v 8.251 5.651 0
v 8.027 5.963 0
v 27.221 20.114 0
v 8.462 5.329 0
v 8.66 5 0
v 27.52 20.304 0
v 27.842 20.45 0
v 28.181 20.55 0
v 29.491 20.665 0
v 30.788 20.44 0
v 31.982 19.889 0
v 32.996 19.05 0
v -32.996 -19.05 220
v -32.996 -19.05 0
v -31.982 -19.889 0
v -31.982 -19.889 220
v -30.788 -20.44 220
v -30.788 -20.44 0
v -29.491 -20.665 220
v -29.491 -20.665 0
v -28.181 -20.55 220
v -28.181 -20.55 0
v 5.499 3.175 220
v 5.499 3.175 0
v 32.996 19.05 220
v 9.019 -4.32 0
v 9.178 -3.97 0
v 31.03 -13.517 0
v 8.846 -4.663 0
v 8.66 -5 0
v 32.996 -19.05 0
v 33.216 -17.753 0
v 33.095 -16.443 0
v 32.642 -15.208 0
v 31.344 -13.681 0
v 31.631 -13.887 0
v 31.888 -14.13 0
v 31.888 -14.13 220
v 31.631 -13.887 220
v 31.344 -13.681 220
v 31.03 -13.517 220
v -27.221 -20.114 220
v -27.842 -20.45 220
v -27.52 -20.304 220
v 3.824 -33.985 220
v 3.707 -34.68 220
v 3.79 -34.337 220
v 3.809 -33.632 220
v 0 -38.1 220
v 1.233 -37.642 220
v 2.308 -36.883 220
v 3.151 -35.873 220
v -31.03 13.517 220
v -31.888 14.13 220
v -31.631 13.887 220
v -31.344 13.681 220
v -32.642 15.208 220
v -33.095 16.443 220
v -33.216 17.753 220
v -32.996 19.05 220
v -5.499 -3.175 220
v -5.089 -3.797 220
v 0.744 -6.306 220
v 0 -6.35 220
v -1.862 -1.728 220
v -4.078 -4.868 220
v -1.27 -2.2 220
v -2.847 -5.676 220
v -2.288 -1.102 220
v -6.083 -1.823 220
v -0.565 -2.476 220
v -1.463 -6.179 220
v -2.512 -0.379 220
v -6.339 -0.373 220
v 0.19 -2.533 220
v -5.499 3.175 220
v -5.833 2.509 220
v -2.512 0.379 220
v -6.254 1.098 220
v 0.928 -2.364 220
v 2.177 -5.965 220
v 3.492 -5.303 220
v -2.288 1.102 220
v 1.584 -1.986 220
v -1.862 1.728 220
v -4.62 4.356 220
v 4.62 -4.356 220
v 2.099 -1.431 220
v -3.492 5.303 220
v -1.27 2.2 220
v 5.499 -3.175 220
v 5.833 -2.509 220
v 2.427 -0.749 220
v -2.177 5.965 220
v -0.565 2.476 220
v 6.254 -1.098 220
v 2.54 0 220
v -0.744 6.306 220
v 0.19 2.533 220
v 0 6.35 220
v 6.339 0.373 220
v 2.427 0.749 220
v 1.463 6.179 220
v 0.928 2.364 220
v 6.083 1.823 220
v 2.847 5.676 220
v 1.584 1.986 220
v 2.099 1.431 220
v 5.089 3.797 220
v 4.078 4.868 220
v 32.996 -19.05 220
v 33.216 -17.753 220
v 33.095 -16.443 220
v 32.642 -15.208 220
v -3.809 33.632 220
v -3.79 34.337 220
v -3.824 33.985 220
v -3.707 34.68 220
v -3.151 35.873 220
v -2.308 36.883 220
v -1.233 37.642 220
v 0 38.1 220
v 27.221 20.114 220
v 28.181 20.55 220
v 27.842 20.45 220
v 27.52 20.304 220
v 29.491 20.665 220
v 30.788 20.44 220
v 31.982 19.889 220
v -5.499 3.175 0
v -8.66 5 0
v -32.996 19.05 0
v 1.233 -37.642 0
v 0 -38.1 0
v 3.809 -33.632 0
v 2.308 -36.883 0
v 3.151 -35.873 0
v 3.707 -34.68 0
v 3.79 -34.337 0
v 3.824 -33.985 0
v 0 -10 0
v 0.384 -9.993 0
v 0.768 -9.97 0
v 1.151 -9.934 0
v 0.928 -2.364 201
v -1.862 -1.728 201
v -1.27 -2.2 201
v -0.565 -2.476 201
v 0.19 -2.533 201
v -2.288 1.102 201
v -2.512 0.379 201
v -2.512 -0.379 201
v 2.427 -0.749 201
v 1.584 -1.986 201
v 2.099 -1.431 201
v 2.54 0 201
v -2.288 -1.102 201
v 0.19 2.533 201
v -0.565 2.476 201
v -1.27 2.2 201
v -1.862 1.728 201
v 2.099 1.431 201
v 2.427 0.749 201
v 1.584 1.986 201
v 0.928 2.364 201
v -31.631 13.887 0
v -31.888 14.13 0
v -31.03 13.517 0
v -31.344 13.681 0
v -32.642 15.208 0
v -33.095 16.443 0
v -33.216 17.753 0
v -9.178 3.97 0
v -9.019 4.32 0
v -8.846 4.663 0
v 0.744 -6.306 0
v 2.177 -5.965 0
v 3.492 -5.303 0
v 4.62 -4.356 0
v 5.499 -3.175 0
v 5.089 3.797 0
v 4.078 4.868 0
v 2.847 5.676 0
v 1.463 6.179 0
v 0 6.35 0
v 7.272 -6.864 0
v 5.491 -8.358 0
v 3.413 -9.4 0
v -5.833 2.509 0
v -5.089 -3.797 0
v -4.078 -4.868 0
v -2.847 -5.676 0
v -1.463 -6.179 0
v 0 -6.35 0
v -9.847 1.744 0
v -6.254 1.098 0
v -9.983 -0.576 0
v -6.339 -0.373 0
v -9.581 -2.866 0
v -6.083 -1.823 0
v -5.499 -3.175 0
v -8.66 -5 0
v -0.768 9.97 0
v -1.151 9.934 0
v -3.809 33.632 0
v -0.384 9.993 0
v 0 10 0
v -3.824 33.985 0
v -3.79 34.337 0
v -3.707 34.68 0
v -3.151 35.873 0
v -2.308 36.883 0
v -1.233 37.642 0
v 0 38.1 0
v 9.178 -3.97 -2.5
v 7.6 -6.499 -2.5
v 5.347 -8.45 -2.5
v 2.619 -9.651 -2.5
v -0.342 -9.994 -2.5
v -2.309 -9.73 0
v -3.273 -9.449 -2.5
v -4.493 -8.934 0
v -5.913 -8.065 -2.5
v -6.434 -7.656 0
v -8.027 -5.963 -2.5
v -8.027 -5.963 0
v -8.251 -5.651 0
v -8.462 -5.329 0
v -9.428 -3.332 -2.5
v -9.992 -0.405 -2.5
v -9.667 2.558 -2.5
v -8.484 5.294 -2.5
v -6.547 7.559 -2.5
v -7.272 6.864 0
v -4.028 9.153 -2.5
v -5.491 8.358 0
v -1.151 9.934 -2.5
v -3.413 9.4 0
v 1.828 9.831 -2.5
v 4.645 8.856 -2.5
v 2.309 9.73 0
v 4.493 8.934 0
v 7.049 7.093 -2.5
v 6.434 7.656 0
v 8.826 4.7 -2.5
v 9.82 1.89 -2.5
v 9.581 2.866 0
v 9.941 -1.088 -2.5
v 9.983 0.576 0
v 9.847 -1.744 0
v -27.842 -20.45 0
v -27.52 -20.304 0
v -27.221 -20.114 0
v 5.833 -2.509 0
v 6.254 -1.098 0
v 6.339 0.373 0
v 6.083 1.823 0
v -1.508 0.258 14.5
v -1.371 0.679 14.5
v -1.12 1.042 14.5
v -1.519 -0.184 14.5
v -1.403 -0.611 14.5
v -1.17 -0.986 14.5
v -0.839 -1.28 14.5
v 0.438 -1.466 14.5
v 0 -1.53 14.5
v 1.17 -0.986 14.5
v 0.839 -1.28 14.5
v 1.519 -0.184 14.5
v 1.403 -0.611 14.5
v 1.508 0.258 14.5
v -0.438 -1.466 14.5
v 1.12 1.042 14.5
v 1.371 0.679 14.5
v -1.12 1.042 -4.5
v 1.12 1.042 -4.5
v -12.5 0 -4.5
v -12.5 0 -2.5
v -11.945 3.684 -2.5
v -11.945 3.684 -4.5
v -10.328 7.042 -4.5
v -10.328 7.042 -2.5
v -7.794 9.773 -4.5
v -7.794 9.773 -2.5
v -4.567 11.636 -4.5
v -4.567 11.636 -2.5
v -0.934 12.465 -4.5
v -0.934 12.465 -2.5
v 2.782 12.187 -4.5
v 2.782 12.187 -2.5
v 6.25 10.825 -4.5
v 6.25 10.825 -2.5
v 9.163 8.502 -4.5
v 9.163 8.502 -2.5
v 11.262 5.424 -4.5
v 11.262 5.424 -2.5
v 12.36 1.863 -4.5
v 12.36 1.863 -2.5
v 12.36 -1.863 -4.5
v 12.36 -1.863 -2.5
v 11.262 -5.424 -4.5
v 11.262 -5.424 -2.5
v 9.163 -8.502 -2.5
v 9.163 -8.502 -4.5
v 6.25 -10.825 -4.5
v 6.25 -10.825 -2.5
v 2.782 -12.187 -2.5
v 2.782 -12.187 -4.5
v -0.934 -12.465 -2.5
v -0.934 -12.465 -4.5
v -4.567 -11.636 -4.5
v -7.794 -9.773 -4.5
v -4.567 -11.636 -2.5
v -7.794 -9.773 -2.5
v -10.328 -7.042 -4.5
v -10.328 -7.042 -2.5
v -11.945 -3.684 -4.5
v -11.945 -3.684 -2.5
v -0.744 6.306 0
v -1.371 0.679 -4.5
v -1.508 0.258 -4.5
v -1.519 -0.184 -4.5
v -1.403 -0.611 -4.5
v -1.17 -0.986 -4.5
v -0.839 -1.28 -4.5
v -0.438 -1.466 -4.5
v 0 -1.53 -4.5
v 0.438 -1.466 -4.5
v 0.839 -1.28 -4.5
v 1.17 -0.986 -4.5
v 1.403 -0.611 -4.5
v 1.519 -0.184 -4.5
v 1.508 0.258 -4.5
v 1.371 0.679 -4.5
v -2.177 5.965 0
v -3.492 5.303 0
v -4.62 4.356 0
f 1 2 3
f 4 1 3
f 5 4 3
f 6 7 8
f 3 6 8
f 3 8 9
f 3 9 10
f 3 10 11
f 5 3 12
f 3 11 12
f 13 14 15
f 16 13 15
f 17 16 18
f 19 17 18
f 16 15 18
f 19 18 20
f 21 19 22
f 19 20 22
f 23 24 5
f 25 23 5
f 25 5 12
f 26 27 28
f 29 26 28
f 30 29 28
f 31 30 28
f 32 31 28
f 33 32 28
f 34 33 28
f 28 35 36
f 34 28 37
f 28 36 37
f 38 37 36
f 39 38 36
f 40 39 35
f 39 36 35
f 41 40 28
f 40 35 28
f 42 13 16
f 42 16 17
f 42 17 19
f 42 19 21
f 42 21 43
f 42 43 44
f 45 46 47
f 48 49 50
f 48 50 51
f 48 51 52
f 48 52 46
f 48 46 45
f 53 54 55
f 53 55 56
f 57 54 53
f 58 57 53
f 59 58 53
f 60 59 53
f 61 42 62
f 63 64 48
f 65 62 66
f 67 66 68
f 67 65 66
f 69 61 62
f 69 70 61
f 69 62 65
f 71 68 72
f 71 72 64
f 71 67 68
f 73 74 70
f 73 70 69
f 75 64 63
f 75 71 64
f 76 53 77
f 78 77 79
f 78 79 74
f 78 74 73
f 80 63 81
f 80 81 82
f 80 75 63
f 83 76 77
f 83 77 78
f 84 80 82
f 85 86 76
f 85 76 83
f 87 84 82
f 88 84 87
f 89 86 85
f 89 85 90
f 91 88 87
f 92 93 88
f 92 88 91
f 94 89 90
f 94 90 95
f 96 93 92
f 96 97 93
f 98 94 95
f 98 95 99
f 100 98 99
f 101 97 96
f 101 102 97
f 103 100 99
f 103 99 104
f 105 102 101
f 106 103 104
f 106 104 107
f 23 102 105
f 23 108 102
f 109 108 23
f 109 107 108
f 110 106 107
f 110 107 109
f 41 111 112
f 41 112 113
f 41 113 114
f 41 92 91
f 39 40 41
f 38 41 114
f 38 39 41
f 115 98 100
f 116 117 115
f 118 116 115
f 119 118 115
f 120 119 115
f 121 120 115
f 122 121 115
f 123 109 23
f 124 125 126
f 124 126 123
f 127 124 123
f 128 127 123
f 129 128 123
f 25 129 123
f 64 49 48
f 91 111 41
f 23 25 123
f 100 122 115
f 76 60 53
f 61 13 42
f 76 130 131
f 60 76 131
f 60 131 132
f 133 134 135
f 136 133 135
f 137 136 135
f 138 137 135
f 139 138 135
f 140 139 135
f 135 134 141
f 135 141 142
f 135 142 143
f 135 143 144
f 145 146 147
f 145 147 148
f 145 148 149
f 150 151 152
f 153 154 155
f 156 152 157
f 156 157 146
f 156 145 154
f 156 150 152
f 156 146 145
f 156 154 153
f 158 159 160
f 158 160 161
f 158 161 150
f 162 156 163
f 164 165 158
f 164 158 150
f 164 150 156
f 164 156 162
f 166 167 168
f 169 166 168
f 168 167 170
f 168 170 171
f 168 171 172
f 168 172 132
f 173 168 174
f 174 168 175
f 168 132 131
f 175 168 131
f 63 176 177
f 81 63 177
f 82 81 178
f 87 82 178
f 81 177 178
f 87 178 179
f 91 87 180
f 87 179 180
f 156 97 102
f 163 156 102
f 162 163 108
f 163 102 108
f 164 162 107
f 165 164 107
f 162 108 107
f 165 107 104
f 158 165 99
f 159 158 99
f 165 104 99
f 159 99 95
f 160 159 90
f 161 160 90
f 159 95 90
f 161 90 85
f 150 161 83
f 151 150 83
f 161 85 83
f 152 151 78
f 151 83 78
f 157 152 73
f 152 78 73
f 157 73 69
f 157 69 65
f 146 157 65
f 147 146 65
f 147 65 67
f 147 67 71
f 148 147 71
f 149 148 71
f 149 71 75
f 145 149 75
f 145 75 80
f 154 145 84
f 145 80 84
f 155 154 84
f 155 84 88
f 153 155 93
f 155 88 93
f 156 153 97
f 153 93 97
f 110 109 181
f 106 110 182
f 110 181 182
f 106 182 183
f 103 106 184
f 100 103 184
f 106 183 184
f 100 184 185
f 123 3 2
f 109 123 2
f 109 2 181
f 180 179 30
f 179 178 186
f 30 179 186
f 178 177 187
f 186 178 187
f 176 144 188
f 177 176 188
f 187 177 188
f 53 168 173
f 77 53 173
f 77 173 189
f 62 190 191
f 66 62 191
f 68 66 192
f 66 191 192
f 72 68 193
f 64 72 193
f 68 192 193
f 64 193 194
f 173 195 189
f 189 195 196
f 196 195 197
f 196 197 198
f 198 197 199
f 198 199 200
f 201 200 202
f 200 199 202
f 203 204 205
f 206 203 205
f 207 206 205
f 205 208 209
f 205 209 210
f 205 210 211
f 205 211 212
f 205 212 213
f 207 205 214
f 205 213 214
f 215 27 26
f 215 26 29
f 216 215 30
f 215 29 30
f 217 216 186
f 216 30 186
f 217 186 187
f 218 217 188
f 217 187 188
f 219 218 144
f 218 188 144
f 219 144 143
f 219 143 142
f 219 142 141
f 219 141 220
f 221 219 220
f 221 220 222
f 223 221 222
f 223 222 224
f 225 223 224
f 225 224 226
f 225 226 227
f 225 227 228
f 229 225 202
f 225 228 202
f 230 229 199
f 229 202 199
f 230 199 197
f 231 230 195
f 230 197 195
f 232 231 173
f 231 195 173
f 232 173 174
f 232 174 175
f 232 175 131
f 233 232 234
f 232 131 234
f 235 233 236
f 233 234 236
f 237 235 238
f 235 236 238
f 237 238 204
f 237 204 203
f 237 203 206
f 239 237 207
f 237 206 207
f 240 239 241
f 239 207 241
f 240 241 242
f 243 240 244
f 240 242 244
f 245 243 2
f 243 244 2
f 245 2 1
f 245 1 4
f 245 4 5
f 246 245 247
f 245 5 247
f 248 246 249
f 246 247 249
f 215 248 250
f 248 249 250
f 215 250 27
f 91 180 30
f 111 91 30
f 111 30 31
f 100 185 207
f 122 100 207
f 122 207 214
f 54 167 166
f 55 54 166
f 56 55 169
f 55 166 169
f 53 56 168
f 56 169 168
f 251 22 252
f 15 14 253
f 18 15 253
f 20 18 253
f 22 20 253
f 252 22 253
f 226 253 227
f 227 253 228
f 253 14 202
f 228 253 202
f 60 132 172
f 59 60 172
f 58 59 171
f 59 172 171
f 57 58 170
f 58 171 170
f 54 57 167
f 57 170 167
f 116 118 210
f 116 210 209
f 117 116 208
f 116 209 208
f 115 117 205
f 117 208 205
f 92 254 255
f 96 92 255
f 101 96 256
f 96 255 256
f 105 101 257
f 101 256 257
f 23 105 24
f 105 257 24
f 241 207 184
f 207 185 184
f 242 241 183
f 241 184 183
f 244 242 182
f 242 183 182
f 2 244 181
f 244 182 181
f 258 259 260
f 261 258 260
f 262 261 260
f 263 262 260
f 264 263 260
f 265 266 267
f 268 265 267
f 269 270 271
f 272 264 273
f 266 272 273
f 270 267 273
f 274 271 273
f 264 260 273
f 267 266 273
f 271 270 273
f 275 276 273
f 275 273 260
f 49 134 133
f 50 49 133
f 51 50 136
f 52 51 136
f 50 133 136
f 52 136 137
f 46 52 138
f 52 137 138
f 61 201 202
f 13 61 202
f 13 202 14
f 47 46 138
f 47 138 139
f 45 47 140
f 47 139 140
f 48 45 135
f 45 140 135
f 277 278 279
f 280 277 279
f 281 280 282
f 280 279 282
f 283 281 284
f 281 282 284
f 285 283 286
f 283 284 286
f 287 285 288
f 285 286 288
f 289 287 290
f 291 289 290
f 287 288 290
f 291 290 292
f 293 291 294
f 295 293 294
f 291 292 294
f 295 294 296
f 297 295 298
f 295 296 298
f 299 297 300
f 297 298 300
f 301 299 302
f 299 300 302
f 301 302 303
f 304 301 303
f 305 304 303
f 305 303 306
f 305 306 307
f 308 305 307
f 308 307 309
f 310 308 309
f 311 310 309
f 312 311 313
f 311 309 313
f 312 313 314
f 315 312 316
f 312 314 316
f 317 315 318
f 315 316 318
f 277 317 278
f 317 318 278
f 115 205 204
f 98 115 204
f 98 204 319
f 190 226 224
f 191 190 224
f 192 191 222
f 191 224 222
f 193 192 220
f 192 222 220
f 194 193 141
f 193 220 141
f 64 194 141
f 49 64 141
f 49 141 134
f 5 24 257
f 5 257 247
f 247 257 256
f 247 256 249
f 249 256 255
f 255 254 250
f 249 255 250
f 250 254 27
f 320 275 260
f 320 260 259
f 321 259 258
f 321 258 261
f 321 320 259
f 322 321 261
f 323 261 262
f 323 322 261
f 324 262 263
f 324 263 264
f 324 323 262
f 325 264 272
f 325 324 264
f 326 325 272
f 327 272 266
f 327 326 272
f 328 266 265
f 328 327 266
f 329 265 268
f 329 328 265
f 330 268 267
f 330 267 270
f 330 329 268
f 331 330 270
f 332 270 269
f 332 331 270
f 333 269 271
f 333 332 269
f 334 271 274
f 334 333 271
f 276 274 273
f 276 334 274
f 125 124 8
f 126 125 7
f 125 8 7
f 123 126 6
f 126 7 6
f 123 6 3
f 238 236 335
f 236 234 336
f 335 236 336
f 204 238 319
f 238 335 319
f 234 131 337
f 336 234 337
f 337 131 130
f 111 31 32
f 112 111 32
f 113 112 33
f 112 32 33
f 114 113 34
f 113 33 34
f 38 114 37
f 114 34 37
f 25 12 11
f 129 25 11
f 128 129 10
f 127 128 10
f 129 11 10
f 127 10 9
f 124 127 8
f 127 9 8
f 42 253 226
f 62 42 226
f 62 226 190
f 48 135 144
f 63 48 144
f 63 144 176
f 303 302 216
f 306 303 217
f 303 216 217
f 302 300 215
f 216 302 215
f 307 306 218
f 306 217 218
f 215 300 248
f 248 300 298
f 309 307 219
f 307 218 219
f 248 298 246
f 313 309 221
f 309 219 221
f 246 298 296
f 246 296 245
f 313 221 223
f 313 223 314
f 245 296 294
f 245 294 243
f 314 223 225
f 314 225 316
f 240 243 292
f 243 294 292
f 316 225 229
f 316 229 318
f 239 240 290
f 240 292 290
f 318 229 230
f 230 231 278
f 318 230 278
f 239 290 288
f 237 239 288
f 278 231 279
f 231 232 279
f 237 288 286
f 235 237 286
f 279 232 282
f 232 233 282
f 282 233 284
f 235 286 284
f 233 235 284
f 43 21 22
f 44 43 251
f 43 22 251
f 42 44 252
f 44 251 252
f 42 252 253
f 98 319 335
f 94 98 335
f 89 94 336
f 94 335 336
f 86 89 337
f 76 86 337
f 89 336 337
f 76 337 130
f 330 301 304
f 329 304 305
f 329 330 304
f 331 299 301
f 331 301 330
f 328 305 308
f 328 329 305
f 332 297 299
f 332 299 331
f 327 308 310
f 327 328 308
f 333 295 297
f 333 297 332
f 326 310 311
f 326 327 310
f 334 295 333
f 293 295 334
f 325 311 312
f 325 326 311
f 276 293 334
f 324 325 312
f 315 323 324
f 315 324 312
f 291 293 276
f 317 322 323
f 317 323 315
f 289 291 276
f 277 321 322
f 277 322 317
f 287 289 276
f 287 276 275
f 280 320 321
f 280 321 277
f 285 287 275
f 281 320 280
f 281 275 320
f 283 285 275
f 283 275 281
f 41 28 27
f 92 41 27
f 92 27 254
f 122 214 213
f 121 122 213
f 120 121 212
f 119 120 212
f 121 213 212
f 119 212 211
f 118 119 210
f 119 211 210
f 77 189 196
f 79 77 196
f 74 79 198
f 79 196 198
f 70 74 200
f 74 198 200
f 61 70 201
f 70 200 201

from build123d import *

# Parameters (mm, degrees)
SKETCH1_R           = 6.35
BOSS_EXTRUDE5_DEPTH = 220
SKETCH9_R           = 10
BOSS_EXTRUDE6_DEPTH = 2.5
SKETCH10_R          = 12.5
BOSS_EXTRUDE7_DEPTH = 2
SKETCH7_R           = 2.54
CUT_EXTRUDE1_DEPTH  = 19
CUT_EXTRUDE2_DEPTH  = 19


with BuildPart() as part:
    # Sketch1 → Boss-Extrude5 (new body)
    with BuildSketch(Plane.XY):
        Circle(SKETCH1_R)
        with BuildLine():
            ThreePointArc((0.744012112, -6.306262441), (0.372648292, -6.33905618), (0, -6.35))
            Line((0, -6.35), (0, -38.1))
            ThreePointArc((0, -38.1), (2.307620454, -36.88268092), (3.706666044, -34.680488981))
            ThreePointArc((3.706666044, -34.680488981), (3.812853299, -34.161384534), (3.809033576, -33.631544397))
            Line((3.809033576, -33.631544397), (0.744012112, -6.306262441))
        make_face()
        with BuildLine():
            ThreePointArc((-5.089377421, -3.79746461), (-5.303459542, -3.492250977), (-5.499261314, -3.175))
            Line((-5.499261314, -3.175), (-32.995567884, -19.05))
            ThreePointArc((-32.995567884, -19.05), (-30.78752841, -20.439798395), (-28.180851452, -20.550311448))
            ThreePointArc((-28.180851452, -20.550311448), (-27.678200185, -20.382720085), (-27.221255028, -20.114492039))
            Line((-27.221255028, -20.114492039), (-5.089377421, -3.79746461))
        make_face()
        with BuildLine():
            ThreePointArc((-5.833389533, 2.508797831), (-5.676107834, 2.846805203), (-5.499261314, 3.175))
            Line((-5.499261314, 3.175), (-32.995567884, 19.05))
            ThreePointArc((-32.995567884, 19.05), (-33.095148863, 16.442882525), (-31.887517495, 14.130177533))
            ThreePointArc((-31.887517495, 14.130177533), (-31.491053484, 13.778664449), (-31.030288604, 13.517052358))
            Line((-31.030288604, 13.517052358), (-5.833389533, 2.508797831))
        make_face()
        with BuildLine():
            Line((-3.809033576, 33.631544397), (-0.744012112, 6.306262441))
            ThreePointArc((-0.744012112, 6.306262441), (-0.372648292, 6.33905618), (0, 6.35))
            Line((0, 6.35), (0, 38.1))
            ThreePointArc((0, 38.1), (-2.307620454, 36.88268092), (-3.706666044, 34.680488981))
            ThreePointArc((-3.706666044, 34.680488981), (-3.812853299, 34.161384534), (-3.809033576, 33.631544397))
        make_face()
        with BuildLine():
            Line((27.221255028, 20.114492039), (5.089377421, 3.79746461))
            ThreePointArc((5.089377421, 3.79746461), (5.303459542, 3.492250977), (5.499261314, 3.175))
            Line((5.499261314, 3.175), (32.995567884, 19.05))
            ThreePointArc((32.995567884, 19.05), (30.78752841, 20.439798395), (28.180851452, 20.550311448))
            ThreePointArc((28.180851452, 20.550311448), (27.678200185, 20.382720085), (27.221255028, 20.114492039))
        make_face()
        with BuildLine():
            Line((31.030288604, -13.517052358), (5.833389533, -2.508797831))
            ThreePointArc((5.833389533, -2.508797831), (5.676107834, -2.846805203), (5.499261314, -3.175))
            Line((5.499261314, -3.175), (32.995567884, -19.05))
            ThreePointArc((32.995567884, -19.05), (33.095148863, -16.442882525), (31.887517495, -14.130177533))
            ThreePointArc((31.887517495, -14.130177533), (31.491053484, -13.778664449), (31.030288604, -13.517052358))
        make_face()
    extrude(amount=BOSS_EXTRUDE5_DEPTH)

    # Sketch9 → Boss-Extrude6 (add)
    with BuildSketch(Plane(origin=(0, 0, 0), x_dir=(-1, 0, 0), z_dir=(0, 0, -1))):
        with Locations(Location((0, 0, 0), (0, 0, 203.391310961))):
            Circle(SKETCH9_R)
    extrude(amount=BOSS_EXTRUDE6_DEPTH)

    # Sketch10 → Boss-Extrude7 (add)
    with BuildSketch(Plane(origin=(0, 0, -2.5), x_dir=(-1, 0, 0), z_dir=(0, 0, -1))):
        Circle(SKETCH10_R)
    extrude(amount=BOSS_EXTRUDE7_DEPTH)

    # Sketch7 → Cut-Extrude1 (cut)
    with BuildSketch(Plane.XY.offset(220)):
        Circle(SKETCH7_R)
    extrude(amount=-CUT_EXTRUDE1_DEPTH, mode=Mode.SUBTRACT)

    # Sketch11 → Cut-Extrude2 (cut)
    with BuildSketch(Plane(origin=(0, 0, -4.5), x_dir=(-1, 0, 0), z_dir=(0, 0, -1))):
        with BuildLine():
            Line((-1.12, 1.042353107), (1.12, 1.042353107))
            ThreePointArc((1.12, 1.042353107), (0, -1.53), (-1.12, 1.042353107))
        make_face()
    extrude(amount=-CUT_EXTRUDE2_DEPTH, mode=Mode.SUBTRACT)


solid = part.part
